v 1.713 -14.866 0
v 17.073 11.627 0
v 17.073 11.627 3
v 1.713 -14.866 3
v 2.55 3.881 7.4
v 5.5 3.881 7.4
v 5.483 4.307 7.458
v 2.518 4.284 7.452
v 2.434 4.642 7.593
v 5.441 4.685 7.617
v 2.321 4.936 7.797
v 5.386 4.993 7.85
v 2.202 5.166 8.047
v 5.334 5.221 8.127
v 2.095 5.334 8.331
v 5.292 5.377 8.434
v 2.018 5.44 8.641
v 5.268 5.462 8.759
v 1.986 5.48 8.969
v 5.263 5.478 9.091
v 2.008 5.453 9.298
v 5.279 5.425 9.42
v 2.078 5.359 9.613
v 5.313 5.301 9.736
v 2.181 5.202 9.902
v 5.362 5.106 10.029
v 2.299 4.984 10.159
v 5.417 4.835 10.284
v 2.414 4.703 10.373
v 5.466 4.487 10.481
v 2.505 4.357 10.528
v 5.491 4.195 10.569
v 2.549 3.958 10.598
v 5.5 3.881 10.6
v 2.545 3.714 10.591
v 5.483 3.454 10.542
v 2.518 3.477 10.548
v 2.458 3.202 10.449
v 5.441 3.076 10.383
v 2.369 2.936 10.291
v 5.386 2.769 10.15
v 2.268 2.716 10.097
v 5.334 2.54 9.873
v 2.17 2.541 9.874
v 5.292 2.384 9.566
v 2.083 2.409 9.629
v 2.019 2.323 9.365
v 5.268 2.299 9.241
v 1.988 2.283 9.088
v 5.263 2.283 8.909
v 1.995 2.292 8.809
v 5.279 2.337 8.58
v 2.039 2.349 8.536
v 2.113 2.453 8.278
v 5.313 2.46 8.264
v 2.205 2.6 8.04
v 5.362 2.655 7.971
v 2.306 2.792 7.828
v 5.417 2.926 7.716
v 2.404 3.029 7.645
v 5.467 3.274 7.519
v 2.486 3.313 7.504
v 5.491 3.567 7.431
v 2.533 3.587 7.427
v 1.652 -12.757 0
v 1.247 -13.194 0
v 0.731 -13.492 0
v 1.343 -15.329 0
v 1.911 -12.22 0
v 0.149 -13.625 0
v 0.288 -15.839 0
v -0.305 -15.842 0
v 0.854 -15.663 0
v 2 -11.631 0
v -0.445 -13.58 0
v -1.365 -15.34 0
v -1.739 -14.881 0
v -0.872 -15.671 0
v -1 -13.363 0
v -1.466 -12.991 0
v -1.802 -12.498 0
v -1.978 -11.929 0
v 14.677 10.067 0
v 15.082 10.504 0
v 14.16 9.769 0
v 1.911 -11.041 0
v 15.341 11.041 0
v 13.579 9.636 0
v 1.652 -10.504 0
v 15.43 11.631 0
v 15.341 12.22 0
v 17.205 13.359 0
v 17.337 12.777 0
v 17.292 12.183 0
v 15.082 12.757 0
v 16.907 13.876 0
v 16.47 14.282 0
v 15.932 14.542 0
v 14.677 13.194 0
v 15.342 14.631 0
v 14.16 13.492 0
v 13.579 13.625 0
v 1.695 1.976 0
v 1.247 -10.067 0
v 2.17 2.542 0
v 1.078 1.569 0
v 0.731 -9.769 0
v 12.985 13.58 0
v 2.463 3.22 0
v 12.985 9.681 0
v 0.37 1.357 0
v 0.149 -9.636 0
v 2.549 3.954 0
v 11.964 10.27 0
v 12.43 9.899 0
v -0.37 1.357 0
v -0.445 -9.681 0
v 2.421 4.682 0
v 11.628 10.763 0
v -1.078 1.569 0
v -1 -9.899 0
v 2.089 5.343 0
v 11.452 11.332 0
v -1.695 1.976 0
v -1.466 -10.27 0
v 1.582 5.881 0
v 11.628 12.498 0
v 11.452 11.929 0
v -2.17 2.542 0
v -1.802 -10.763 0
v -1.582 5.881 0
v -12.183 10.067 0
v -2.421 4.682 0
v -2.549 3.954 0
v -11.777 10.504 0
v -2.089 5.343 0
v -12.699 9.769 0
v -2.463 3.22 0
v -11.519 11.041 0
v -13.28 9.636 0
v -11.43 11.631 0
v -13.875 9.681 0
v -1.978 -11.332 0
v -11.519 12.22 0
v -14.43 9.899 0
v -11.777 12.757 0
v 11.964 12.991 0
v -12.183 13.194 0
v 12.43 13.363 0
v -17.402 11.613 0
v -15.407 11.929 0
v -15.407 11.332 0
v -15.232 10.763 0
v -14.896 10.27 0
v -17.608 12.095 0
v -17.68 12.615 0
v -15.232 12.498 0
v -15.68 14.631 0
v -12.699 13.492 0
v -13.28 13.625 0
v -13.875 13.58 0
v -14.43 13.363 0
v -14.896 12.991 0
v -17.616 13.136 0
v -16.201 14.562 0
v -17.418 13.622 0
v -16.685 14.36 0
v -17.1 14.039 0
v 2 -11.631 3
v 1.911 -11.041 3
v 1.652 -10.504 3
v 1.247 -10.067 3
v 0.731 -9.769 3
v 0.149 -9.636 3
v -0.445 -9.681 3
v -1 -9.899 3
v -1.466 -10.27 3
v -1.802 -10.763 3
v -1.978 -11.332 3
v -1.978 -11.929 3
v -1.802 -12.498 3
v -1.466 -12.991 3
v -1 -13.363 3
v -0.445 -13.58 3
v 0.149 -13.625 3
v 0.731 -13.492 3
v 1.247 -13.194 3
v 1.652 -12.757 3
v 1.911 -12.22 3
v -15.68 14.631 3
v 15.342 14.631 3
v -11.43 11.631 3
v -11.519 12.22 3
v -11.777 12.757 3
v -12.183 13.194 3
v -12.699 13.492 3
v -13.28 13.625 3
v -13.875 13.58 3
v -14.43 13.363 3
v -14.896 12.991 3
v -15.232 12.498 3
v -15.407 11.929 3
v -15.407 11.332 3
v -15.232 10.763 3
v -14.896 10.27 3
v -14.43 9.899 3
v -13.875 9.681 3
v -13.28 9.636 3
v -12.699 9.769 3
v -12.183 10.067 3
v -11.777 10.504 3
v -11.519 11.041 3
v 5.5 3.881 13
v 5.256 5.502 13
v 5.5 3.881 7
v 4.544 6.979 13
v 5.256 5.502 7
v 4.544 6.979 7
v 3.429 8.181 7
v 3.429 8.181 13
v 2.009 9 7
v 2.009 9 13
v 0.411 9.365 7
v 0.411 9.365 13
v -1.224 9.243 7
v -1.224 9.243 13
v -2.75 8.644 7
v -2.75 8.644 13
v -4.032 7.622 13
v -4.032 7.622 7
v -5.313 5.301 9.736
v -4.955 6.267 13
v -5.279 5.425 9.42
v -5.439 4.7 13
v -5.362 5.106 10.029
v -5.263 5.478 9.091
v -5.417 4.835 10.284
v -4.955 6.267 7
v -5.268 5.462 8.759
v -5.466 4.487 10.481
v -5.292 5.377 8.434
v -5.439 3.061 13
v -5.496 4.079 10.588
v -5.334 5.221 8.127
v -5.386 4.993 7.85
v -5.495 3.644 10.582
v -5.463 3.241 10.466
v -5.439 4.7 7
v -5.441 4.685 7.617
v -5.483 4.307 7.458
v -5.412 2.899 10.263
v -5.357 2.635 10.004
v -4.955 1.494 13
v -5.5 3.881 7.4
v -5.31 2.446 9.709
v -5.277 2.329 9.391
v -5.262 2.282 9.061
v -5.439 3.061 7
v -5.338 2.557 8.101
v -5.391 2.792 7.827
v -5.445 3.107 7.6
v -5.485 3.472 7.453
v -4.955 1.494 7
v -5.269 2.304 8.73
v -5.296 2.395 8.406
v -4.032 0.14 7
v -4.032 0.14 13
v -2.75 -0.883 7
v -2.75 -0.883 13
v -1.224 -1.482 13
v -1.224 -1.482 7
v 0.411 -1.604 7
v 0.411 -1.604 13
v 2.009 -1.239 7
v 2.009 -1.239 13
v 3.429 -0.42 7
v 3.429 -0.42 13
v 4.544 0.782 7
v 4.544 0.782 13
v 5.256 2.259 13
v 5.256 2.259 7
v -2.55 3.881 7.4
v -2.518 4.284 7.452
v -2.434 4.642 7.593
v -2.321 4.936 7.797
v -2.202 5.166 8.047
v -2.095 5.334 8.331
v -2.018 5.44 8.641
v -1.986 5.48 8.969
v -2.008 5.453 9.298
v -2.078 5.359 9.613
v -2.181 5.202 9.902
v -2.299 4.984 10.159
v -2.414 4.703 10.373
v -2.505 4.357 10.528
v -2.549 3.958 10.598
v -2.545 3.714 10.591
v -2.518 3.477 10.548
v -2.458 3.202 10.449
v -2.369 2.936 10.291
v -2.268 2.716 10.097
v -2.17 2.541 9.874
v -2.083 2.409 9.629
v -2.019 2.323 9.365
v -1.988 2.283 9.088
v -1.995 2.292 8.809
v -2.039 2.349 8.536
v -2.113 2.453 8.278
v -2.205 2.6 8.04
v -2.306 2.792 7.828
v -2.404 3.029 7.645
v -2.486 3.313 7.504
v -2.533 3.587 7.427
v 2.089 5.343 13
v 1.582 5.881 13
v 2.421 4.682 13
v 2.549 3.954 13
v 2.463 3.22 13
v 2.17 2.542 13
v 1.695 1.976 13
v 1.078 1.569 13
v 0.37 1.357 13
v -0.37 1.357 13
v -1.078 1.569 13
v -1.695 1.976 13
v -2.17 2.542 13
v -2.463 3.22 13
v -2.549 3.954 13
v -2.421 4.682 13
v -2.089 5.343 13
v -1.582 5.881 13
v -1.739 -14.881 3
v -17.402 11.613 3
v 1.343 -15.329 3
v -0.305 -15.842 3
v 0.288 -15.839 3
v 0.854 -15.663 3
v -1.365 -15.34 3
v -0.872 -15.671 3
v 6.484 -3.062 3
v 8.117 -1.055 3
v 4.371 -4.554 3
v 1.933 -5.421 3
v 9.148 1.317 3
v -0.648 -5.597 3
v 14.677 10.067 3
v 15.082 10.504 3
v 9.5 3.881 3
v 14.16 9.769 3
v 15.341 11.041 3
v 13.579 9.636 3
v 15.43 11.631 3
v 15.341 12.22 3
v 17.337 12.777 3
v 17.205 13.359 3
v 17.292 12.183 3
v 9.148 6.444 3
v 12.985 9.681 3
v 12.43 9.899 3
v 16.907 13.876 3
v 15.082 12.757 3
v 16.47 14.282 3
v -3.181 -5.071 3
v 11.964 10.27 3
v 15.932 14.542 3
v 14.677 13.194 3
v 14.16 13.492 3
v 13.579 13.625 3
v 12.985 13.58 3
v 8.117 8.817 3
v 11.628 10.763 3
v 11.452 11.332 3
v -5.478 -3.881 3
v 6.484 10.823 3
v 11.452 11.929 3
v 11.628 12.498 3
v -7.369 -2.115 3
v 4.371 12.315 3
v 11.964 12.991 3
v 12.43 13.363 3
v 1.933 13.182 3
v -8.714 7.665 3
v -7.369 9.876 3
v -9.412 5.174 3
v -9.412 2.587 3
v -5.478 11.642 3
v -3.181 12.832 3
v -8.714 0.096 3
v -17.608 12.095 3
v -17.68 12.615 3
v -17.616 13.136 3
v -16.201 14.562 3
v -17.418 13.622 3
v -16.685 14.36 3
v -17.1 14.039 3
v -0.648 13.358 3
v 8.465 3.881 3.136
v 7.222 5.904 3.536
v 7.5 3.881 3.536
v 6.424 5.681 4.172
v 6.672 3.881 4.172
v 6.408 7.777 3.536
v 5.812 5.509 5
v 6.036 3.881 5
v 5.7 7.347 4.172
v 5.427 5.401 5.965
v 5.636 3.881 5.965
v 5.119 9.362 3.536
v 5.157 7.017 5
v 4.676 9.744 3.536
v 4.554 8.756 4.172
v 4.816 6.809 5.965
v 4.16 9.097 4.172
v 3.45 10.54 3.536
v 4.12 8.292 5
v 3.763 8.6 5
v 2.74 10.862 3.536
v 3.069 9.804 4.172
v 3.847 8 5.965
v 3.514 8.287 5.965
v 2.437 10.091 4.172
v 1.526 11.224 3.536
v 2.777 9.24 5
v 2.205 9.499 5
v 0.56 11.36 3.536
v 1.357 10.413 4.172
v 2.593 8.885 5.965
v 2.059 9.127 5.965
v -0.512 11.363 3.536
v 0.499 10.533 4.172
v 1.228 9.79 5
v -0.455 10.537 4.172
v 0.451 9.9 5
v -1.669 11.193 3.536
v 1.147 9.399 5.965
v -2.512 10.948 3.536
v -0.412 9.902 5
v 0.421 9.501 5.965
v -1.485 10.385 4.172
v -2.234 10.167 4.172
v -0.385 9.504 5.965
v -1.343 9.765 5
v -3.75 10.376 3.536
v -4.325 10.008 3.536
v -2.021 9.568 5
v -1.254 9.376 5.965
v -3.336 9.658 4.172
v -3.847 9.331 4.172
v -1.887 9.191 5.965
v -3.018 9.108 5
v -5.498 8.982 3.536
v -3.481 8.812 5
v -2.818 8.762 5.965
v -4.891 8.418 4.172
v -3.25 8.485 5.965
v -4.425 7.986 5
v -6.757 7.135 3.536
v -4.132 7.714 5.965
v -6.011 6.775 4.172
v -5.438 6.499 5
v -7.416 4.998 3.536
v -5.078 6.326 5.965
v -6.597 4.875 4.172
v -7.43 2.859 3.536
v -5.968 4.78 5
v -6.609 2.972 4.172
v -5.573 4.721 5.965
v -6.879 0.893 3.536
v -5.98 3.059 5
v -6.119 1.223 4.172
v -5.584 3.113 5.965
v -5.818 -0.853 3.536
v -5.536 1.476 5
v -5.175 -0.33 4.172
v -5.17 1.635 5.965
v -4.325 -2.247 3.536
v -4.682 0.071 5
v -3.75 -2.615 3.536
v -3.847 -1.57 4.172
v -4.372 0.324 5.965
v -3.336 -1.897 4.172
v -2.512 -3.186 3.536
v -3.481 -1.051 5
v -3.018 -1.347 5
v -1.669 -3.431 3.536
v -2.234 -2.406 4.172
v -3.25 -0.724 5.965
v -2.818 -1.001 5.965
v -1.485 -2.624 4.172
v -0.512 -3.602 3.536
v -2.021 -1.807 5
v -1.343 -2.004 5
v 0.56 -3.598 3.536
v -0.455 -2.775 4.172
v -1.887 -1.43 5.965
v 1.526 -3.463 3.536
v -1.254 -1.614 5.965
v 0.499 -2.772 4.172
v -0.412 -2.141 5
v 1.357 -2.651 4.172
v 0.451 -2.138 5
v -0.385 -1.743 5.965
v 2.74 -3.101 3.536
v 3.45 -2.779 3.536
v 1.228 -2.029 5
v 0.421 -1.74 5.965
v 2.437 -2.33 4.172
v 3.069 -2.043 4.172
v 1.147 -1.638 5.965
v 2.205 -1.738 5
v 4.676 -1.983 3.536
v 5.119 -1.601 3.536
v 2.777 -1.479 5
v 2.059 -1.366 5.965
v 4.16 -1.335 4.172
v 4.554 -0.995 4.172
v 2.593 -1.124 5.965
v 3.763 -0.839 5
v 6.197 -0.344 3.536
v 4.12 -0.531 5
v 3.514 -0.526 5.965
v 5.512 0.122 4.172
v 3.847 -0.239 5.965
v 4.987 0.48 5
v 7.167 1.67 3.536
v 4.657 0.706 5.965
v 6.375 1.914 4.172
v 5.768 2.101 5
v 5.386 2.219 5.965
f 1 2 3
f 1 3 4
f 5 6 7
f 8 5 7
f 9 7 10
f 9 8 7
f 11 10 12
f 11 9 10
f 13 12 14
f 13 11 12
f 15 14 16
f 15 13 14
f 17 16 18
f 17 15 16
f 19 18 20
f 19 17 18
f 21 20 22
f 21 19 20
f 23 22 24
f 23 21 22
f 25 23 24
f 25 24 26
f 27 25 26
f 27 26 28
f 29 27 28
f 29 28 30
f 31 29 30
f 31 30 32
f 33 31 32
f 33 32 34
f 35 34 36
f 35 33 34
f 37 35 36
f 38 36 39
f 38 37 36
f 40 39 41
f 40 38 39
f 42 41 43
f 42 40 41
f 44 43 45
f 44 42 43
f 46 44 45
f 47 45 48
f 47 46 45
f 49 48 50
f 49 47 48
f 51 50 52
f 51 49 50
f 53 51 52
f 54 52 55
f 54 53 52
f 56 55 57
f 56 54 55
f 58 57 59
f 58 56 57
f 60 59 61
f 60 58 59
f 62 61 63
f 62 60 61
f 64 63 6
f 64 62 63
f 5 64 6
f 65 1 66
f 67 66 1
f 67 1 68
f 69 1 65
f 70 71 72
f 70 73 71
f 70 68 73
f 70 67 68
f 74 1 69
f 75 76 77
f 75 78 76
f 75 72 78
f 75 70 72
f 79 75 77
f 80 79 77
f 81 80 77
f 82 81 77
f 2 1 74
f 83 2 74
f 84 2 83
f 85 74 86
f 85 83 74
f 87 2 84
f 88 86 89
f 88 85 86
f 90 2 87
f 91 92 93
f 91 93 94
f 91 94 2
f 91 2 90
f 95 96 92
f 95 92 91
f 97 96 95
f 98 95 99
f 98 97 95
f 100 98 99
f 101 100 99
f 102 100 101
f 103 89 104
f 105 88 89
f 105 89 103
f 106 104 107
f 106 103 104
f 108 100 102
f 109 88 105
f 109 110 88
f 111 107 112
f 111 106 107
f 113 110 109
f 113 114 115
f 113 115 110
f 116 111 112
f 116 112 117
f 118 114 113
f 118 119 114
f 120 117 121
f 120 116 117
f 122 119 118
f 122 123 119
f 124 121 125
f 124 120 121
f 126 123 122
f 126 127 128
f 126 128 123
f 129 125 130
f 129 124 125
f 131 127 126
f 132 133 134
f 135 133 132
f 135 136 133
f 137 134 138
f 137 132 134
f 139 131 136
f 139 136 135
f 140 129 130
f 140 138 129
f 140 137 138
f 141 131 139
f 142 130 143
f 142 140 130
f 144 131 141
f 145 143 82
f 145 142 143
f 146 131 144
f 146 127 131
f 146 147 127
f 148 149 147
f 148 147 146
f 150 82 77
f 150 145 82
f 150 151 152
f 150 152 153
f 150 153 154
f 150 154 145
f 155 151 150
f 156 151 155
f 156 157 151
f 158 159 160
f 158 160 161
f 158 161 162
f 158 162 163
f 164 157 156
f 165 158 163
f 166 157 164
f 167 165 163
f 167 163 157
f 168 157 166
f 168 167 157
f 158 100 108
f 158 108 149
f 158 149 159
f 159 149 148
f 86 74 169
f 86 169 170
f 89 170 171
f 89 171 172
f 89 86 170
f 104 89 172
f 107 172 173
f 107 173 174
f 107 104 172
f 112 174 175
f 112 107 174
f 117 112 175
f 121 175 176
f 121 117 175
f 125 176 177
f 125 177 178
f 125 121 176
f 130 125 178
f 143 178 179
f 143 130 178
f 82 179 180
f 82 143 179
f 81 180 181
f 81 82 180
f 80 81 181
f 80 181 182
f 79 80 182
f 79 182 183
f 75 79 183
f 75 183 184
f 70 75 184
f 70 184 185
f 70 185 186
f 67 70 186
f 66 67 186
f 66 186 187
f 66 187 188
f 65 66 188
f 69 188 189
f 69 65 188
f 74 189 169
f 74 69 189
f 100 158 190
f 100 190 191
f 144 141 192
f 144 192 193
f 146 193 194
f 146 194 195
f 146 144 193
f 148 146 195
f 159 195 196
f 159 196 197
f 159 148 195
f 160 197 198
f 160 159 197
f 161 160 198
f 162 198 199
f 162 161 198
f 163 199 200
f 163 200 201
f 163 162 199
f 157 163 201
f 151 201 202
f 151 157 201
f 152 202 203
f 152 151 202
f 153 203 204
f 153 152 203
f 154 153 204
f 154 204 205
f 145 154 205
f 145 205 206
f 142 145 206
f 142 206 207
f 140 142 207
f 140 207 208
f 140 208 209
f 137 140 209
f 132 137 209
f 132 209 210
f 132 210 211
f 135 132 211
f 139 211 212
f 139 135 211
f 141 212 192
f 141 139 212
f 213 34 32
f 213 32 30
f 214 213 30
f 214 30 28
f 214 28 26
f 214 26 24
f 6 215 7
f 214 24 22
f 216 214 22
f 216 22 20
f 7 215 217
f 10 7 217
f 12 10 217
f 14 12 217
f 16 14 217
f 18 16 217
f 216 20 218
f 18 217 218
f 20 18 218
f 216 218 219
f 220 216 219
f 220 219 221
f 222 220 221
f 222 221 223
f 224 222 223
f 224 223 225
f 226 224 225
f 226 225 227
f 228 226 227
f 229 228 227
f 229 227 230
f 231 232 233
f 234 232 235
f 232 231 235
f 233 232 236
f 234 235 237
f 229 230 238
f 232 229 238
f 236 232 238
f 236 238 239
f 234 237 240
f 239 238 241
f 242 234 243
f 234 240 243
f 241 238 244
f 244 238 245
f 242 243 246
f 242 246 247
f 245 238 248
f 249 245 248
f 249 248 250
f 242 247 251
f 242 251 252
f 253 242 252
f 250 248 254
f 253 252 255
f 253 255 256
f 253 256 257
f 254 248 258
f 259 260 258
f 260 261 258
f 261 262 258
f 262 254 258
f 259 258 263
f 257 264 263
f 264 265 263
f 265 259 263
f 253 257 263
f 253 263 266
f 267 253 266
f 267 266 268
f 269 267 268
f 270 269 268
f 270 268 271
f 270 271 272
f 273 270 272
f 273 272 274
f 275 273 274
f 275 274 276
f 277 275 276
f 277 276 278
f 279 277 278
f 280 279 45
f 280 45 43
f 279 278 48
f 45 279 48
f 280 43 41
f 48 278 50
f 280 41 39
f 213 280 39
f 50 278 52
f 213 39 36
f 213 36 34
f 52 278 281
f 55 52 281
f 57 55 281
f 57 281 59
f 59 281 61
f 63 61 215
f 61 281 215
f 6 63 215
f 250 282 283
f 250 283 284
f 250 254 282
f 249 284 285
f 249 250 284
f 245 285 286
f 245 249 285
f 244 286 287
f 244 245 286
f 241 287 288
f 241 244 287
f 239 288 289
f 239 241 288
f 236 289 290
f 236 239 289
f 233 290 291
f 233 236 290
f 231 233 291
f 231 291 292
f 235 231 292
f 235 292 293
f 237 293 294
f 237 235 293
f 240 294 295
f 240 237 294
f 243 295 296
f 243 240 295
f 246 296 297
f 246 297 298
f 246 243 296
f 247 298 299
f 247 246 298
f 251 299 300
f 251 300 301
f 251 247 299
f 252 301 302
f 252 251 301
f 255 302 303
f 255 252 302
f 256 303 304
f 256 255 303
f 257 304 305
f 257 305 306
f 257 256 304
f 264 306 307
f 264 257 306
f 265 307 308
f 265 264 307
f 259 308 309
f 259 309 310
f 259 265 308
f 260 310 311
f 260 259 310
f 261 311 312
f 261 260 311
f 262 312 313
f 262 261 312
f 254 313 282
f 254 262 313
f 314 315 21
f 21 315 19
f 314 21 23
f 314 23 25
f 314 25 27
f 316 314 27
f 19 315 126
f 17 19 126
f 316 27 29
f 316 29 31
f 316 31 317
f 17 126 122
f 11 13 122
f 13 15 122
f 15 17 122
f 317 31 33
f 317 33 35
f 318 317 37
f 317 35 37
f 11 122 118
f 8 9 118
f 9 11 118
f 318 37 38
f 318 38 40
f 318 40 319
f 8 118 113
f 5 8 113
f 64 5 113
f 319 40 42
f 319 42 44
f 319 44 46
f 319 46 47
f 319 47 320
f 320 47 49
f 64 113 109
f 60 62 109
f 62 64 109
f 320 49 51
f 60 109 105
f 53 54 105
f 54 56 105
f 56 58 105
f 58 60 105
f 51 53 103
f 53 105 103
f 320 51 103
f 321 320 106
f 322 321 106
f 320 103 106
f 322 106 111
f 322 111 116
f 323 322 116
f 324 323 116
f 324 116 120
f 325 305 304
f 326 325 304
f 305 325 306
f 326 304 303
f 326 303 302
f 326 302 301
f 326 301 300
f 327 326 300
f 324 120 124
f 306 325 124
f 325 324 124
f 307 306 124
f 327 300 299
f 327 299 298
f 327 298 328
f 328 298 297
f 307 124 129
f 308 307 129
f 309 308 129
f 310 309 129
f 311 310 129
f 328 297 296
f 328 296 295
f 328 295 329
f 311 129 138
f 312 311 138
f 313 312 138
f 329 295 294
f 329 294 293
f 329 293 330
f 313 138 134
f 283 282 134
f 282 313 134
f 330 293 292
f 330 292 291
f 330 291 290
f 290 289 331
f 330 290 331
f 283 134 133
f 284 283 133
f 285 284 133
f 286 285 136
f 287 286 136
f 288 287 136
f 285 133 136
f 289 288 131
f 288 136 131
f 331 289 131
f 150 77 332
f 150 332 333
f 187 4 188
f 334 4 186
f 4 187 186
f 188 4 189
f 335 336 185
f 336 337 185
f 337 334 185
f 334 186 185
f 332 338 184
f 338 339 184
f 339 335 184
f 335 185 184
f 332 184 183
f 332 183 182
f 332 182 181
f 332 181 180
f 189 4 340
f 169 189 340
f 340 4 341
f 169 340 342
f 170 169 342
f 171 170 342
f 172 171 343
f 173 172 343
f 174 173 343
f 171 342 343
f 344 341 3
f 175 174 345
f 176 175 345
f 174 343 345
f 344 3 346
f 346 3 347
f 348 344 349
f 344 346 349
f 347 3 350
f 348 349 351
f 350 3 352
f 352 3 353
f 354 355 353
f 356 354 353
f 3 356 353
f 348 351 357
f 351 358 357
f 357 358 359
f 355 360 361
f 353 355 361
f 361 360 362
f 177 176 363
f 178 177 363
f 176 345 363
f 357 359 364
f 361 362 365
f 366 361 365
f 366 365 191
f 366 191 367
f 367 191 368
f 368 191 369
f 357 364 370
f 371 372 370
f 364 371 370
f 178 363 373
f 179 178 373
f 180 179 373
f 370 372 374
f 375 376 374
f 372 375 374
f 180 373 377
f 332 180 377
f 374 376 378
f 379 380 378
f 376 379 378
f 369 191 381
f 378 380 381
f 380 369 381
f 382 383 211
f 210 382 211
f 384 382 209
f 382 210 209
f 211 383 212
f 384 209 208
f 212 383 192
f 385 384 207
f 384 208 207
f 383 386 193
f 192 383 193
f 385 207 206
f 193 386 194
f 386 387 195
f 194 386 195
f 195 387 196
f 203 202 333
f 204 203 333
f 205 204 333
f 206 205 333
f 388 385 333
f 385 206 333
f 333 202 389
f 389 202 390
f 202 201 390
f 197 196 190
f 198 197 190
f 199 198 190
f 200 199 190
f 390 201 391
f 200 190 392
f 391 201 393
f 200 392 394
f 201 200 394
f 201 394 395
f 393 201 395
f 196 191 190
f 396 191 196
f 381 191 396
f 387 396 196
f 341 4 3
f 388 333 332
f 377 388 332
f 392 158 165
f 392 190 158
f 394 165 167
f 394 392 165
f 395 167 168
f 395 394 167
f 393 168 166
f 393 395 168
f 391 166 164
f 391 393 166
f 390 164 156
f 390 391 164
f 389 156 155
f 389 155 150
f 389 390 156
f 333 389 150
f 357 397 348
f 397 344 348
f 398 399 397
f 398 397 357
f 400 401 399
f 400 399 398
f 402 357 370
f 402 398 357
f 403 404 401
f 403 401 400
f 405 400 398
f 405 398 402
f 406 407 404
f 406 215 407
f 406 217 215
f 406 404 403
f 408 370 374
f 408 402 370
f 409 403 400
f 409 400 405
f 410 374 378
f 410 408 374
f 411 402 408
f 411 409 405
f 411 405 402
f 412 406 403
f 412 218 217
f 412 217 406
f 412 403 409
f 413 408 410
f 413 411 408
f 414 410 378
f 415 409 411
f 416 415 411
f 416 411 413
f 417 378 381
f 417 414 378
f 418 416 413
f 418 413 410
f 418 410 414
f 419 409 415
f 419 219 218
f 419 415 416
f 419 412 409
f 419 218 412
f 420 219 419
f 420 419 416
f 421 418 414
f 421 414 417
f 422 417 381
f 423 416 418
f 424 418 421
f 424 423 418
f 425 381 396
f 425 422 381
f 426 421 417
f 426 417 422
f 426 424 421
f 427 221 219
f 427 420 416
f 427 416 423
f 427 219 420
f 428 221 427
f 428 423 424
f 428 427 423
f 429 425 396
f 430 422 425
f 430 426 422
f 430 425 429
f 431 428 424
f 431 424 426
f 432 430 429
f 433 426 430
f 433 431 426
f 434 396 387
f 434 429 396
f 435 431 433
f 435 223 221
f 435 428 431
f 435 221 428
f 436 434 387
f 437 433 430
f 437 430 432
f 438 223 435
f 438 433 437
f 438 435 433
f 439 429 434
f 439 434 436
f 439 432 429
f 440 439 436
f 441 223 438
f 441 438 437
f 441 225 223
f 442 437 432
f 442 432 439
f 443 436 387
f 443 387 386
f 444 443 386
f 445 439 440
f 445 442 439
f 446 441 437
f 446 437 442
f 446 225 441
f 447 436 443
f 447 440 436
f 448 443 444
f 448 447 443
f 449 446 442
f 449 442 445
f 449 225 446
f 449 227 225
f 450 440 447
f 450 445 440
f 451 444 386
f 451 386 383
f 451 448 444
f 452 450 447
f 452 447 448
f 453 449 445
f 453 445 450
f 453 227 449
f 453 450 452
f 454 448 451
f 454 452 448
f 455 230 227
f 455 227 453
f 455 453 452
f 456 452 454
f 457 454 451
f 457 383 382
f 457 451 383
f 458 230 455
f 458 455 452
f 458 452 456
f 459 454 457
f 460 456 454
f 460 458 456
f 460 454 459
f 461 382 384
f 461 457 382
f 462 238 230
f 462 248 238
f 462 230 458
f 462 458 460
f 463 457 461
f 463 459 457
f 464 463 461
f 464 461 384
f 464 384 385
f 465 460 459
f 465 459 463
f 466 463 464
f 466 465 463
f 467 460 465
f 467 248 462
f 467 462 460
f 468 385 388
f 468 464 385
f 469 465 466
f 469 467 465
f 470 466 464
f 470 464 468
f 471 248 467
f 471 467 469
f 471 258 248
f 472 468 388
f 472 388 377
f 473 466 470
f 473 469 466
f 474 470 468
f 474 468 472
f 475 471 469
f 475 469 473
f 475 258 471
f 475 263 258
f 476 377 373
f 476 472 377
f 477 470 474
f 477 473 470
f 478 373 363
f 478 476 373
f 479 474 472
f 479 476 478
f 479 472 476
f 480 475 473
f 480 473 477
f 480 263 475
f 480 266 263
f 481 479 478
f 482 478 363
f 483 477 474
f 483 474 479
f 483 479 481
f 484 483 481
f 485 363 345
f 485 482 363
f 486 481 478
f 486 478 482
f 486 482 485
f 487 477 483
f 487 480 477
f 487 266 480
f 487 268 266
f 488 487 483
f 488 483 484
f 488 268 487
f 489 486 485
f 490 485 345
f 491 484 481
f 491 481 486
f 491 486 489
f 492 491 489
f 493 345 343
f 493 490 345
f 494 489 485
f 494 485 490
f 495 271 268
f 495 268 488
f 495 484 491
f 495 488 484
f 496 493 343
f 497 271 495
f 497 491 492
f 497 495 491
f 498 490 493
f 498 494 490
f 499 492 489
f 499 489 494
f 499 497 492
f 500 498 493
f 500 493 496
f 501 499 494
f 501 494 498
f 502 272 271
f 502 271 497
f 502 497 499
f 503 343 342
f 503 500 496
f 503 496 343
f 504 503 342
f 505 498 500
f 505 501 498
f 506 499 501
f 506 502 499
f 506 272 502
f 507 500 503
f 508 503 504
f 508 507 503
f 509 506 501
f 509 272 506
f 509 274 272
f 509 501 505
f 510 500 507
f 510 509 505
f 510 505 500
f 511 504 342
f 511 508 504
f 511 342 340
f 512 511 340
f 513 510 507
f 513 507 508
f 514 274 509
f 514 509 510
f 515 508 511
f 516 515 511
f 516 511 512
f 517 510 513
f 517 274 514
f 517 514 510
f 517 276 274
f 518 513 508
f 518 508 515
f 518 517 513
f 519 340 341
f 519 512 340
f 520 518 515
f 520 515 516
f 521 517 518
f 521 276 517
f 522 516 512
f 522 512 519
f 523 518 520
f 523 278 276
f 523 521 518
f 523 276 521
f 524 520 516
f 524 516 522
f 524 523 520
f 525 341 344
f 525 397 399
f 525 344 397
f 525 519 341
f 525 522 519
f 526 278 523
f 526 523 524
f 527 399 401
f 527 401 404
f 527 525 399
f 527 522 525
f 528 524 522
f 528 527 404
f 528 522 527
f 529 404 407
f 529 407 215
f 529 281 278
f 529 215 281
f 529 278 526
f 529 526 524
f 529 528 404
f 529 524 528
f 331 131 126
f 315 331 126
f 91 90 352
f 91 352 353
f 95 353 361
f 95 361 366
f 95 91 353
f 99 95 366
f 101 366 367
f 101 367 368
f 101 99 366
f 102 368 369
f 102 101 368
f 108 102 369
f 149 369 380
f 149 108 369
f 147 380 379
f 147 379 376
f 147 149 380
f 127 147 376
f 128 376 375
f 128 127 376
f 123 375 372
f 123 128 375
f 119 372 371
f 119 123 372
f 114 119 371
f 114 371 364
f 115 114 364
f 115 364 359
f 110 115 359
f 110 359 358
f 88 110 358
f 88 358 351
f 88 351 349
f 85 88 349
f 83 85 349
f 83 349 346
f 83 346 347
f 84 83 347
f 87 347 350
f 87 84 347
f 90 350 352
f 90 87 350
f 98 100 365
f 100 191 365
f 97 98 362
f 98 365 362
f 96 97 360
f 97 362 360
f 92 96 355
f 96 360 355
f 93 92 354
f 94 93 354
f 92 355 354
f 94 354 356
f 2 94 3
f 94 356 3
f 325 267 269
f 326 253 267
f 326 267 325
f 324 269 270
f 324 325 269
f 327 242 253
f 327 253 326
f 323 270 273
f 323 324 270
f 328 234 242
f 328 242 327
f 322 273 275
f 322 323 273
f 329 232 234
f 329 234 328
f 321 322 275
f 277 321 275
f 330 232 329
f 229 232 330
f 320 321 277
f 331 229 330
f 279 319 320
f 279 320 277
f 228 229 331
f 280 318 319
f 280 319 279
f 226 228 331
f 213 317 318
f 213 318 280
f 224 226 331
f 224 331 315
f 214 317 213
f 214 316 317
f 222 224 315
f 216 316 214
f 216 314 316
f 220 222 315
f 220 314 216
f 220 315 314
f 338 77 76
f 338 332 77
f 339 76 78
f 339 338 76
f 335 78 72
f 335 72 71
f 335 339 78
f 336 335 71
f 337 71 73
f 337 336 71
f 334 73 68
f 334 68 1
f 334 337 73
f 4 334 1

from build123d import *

# Parameters (mm, degrees)
SKETCH1_R               = 2.000000038
SKETCH1_R_2             = 1.999999864
SKETCH1_R_3             = 1.999999855
BOSS_EXTRUDE1_DEPTH     = 3
SKETCH2_R               = 5.5
BOSS_EXTRUDE2_DEPTH     = 10
CUT_EXTRUDE1_DEPTH      = 30.235355095
CUT_EXTRUDE1_DEPTH_BACK = 30.235355095
FILLET1_R               = 2
FILLET2_R               = 4
CUT_EXTRUDE2_DEPTH      = 28.078088376
CUT_EXTRUDE2_DEPTH_BACK = 28.078088376
SKETCH4_R               = 1.6


with BuildPart() as part:
    # Sketch1 → Boss-Extrude1 (new body)
    with BuildSketch(Plane.XY):
        Polygon((-19.186339187, 14.630551858), (18.813660813, 14.630551858), (1.3e-07, -17.821065516), align=None)
        with Locations((-13.429805086, 11.630551858)):
            Circle(SKETCH1_R, mode=Mode.SUBTRACT)
        with Locations((13.429804917, 11.630551858)):
            Circle(SKETCH1_R_2, mode=Mode.SUBTRACT)
        with Locations((8.5e-08, -11.630551858)):
            Circle(SKETCH1_R_3, mode=Mode.SUBTRACT)
    extrude(amount=BOSS_EXTRUDE1_DEPTH)

    # Sketch2 → Boss-Extrude2 (add)
    with BuildSketch(Plane.XY.offset(3)):
        with Locations((0, 3.880551858)):
            Circle(SKETCH2_R)
    extrude(amount=BOSS_EXTRUDE2_DEPTH)

    # Sketch3 → Cut-Extrude1 (cut, two sides: drawn at the far end of the back side and taken through both)
    with BuildSketch(Plane.XY.offset(13).offset(-CUT_EXTRUDE1_DEPTH_BACK)):
        with BuildLine():
            Line((-1.581929202, 5.880551858), (1.581929202, 5.880551858))
            ThreePointArc((1.581929202, 5.880551858), (0, 1.330551858), (-1.581929202, 5.880551858))
        make_face()
    extrude(amount=CUT_EXTRUDE1_DEPTH + CUT_EXTRUDE1_DEPTH_BACK, mode=Mode.SUBTRACT)

    # Fillet1
    fillet1_edges = [part.edges().sort_by_distance(p)[0] for p in [
        (-19.186339187, 14.630551858, 1.5),
        (18.813660813, 14.630551858, 1.5),
        (1.3e-07, -17.821065516, 1.5),
    ]]
    fillet(fillet1_edges, radius=FILLET1_R)

    # Fillet2
    fillet2_edges = [part.edges().sort_by_distance(p)[0] for p in [
        (-5.5, 3.880551858, 3),
    ]]
    fillet(fillet2_edges, radius=FILLET2_R)

    # Sketch4 → Cut-Extrude2 (cut, two sides: drawn at the far end of the back side and taken through both)
    with BuildSketch(Plane(origin=(0, 0, 0), x_dir=(0, 0, -1), z_dir=(1, 0, 0)).offset(-CUT_EXTRUDE2_DEPTH_BACK)):
        with Locations((-9, 3.880551858)):
            Circle(SKETCH4_R)
    extrude(amount=CUT_EXTRUDE2_DEPTH + CUT_EXTRUDE2_DEPTH_BACK, mode=Mode.SUBTRACT)


solid = part.part
